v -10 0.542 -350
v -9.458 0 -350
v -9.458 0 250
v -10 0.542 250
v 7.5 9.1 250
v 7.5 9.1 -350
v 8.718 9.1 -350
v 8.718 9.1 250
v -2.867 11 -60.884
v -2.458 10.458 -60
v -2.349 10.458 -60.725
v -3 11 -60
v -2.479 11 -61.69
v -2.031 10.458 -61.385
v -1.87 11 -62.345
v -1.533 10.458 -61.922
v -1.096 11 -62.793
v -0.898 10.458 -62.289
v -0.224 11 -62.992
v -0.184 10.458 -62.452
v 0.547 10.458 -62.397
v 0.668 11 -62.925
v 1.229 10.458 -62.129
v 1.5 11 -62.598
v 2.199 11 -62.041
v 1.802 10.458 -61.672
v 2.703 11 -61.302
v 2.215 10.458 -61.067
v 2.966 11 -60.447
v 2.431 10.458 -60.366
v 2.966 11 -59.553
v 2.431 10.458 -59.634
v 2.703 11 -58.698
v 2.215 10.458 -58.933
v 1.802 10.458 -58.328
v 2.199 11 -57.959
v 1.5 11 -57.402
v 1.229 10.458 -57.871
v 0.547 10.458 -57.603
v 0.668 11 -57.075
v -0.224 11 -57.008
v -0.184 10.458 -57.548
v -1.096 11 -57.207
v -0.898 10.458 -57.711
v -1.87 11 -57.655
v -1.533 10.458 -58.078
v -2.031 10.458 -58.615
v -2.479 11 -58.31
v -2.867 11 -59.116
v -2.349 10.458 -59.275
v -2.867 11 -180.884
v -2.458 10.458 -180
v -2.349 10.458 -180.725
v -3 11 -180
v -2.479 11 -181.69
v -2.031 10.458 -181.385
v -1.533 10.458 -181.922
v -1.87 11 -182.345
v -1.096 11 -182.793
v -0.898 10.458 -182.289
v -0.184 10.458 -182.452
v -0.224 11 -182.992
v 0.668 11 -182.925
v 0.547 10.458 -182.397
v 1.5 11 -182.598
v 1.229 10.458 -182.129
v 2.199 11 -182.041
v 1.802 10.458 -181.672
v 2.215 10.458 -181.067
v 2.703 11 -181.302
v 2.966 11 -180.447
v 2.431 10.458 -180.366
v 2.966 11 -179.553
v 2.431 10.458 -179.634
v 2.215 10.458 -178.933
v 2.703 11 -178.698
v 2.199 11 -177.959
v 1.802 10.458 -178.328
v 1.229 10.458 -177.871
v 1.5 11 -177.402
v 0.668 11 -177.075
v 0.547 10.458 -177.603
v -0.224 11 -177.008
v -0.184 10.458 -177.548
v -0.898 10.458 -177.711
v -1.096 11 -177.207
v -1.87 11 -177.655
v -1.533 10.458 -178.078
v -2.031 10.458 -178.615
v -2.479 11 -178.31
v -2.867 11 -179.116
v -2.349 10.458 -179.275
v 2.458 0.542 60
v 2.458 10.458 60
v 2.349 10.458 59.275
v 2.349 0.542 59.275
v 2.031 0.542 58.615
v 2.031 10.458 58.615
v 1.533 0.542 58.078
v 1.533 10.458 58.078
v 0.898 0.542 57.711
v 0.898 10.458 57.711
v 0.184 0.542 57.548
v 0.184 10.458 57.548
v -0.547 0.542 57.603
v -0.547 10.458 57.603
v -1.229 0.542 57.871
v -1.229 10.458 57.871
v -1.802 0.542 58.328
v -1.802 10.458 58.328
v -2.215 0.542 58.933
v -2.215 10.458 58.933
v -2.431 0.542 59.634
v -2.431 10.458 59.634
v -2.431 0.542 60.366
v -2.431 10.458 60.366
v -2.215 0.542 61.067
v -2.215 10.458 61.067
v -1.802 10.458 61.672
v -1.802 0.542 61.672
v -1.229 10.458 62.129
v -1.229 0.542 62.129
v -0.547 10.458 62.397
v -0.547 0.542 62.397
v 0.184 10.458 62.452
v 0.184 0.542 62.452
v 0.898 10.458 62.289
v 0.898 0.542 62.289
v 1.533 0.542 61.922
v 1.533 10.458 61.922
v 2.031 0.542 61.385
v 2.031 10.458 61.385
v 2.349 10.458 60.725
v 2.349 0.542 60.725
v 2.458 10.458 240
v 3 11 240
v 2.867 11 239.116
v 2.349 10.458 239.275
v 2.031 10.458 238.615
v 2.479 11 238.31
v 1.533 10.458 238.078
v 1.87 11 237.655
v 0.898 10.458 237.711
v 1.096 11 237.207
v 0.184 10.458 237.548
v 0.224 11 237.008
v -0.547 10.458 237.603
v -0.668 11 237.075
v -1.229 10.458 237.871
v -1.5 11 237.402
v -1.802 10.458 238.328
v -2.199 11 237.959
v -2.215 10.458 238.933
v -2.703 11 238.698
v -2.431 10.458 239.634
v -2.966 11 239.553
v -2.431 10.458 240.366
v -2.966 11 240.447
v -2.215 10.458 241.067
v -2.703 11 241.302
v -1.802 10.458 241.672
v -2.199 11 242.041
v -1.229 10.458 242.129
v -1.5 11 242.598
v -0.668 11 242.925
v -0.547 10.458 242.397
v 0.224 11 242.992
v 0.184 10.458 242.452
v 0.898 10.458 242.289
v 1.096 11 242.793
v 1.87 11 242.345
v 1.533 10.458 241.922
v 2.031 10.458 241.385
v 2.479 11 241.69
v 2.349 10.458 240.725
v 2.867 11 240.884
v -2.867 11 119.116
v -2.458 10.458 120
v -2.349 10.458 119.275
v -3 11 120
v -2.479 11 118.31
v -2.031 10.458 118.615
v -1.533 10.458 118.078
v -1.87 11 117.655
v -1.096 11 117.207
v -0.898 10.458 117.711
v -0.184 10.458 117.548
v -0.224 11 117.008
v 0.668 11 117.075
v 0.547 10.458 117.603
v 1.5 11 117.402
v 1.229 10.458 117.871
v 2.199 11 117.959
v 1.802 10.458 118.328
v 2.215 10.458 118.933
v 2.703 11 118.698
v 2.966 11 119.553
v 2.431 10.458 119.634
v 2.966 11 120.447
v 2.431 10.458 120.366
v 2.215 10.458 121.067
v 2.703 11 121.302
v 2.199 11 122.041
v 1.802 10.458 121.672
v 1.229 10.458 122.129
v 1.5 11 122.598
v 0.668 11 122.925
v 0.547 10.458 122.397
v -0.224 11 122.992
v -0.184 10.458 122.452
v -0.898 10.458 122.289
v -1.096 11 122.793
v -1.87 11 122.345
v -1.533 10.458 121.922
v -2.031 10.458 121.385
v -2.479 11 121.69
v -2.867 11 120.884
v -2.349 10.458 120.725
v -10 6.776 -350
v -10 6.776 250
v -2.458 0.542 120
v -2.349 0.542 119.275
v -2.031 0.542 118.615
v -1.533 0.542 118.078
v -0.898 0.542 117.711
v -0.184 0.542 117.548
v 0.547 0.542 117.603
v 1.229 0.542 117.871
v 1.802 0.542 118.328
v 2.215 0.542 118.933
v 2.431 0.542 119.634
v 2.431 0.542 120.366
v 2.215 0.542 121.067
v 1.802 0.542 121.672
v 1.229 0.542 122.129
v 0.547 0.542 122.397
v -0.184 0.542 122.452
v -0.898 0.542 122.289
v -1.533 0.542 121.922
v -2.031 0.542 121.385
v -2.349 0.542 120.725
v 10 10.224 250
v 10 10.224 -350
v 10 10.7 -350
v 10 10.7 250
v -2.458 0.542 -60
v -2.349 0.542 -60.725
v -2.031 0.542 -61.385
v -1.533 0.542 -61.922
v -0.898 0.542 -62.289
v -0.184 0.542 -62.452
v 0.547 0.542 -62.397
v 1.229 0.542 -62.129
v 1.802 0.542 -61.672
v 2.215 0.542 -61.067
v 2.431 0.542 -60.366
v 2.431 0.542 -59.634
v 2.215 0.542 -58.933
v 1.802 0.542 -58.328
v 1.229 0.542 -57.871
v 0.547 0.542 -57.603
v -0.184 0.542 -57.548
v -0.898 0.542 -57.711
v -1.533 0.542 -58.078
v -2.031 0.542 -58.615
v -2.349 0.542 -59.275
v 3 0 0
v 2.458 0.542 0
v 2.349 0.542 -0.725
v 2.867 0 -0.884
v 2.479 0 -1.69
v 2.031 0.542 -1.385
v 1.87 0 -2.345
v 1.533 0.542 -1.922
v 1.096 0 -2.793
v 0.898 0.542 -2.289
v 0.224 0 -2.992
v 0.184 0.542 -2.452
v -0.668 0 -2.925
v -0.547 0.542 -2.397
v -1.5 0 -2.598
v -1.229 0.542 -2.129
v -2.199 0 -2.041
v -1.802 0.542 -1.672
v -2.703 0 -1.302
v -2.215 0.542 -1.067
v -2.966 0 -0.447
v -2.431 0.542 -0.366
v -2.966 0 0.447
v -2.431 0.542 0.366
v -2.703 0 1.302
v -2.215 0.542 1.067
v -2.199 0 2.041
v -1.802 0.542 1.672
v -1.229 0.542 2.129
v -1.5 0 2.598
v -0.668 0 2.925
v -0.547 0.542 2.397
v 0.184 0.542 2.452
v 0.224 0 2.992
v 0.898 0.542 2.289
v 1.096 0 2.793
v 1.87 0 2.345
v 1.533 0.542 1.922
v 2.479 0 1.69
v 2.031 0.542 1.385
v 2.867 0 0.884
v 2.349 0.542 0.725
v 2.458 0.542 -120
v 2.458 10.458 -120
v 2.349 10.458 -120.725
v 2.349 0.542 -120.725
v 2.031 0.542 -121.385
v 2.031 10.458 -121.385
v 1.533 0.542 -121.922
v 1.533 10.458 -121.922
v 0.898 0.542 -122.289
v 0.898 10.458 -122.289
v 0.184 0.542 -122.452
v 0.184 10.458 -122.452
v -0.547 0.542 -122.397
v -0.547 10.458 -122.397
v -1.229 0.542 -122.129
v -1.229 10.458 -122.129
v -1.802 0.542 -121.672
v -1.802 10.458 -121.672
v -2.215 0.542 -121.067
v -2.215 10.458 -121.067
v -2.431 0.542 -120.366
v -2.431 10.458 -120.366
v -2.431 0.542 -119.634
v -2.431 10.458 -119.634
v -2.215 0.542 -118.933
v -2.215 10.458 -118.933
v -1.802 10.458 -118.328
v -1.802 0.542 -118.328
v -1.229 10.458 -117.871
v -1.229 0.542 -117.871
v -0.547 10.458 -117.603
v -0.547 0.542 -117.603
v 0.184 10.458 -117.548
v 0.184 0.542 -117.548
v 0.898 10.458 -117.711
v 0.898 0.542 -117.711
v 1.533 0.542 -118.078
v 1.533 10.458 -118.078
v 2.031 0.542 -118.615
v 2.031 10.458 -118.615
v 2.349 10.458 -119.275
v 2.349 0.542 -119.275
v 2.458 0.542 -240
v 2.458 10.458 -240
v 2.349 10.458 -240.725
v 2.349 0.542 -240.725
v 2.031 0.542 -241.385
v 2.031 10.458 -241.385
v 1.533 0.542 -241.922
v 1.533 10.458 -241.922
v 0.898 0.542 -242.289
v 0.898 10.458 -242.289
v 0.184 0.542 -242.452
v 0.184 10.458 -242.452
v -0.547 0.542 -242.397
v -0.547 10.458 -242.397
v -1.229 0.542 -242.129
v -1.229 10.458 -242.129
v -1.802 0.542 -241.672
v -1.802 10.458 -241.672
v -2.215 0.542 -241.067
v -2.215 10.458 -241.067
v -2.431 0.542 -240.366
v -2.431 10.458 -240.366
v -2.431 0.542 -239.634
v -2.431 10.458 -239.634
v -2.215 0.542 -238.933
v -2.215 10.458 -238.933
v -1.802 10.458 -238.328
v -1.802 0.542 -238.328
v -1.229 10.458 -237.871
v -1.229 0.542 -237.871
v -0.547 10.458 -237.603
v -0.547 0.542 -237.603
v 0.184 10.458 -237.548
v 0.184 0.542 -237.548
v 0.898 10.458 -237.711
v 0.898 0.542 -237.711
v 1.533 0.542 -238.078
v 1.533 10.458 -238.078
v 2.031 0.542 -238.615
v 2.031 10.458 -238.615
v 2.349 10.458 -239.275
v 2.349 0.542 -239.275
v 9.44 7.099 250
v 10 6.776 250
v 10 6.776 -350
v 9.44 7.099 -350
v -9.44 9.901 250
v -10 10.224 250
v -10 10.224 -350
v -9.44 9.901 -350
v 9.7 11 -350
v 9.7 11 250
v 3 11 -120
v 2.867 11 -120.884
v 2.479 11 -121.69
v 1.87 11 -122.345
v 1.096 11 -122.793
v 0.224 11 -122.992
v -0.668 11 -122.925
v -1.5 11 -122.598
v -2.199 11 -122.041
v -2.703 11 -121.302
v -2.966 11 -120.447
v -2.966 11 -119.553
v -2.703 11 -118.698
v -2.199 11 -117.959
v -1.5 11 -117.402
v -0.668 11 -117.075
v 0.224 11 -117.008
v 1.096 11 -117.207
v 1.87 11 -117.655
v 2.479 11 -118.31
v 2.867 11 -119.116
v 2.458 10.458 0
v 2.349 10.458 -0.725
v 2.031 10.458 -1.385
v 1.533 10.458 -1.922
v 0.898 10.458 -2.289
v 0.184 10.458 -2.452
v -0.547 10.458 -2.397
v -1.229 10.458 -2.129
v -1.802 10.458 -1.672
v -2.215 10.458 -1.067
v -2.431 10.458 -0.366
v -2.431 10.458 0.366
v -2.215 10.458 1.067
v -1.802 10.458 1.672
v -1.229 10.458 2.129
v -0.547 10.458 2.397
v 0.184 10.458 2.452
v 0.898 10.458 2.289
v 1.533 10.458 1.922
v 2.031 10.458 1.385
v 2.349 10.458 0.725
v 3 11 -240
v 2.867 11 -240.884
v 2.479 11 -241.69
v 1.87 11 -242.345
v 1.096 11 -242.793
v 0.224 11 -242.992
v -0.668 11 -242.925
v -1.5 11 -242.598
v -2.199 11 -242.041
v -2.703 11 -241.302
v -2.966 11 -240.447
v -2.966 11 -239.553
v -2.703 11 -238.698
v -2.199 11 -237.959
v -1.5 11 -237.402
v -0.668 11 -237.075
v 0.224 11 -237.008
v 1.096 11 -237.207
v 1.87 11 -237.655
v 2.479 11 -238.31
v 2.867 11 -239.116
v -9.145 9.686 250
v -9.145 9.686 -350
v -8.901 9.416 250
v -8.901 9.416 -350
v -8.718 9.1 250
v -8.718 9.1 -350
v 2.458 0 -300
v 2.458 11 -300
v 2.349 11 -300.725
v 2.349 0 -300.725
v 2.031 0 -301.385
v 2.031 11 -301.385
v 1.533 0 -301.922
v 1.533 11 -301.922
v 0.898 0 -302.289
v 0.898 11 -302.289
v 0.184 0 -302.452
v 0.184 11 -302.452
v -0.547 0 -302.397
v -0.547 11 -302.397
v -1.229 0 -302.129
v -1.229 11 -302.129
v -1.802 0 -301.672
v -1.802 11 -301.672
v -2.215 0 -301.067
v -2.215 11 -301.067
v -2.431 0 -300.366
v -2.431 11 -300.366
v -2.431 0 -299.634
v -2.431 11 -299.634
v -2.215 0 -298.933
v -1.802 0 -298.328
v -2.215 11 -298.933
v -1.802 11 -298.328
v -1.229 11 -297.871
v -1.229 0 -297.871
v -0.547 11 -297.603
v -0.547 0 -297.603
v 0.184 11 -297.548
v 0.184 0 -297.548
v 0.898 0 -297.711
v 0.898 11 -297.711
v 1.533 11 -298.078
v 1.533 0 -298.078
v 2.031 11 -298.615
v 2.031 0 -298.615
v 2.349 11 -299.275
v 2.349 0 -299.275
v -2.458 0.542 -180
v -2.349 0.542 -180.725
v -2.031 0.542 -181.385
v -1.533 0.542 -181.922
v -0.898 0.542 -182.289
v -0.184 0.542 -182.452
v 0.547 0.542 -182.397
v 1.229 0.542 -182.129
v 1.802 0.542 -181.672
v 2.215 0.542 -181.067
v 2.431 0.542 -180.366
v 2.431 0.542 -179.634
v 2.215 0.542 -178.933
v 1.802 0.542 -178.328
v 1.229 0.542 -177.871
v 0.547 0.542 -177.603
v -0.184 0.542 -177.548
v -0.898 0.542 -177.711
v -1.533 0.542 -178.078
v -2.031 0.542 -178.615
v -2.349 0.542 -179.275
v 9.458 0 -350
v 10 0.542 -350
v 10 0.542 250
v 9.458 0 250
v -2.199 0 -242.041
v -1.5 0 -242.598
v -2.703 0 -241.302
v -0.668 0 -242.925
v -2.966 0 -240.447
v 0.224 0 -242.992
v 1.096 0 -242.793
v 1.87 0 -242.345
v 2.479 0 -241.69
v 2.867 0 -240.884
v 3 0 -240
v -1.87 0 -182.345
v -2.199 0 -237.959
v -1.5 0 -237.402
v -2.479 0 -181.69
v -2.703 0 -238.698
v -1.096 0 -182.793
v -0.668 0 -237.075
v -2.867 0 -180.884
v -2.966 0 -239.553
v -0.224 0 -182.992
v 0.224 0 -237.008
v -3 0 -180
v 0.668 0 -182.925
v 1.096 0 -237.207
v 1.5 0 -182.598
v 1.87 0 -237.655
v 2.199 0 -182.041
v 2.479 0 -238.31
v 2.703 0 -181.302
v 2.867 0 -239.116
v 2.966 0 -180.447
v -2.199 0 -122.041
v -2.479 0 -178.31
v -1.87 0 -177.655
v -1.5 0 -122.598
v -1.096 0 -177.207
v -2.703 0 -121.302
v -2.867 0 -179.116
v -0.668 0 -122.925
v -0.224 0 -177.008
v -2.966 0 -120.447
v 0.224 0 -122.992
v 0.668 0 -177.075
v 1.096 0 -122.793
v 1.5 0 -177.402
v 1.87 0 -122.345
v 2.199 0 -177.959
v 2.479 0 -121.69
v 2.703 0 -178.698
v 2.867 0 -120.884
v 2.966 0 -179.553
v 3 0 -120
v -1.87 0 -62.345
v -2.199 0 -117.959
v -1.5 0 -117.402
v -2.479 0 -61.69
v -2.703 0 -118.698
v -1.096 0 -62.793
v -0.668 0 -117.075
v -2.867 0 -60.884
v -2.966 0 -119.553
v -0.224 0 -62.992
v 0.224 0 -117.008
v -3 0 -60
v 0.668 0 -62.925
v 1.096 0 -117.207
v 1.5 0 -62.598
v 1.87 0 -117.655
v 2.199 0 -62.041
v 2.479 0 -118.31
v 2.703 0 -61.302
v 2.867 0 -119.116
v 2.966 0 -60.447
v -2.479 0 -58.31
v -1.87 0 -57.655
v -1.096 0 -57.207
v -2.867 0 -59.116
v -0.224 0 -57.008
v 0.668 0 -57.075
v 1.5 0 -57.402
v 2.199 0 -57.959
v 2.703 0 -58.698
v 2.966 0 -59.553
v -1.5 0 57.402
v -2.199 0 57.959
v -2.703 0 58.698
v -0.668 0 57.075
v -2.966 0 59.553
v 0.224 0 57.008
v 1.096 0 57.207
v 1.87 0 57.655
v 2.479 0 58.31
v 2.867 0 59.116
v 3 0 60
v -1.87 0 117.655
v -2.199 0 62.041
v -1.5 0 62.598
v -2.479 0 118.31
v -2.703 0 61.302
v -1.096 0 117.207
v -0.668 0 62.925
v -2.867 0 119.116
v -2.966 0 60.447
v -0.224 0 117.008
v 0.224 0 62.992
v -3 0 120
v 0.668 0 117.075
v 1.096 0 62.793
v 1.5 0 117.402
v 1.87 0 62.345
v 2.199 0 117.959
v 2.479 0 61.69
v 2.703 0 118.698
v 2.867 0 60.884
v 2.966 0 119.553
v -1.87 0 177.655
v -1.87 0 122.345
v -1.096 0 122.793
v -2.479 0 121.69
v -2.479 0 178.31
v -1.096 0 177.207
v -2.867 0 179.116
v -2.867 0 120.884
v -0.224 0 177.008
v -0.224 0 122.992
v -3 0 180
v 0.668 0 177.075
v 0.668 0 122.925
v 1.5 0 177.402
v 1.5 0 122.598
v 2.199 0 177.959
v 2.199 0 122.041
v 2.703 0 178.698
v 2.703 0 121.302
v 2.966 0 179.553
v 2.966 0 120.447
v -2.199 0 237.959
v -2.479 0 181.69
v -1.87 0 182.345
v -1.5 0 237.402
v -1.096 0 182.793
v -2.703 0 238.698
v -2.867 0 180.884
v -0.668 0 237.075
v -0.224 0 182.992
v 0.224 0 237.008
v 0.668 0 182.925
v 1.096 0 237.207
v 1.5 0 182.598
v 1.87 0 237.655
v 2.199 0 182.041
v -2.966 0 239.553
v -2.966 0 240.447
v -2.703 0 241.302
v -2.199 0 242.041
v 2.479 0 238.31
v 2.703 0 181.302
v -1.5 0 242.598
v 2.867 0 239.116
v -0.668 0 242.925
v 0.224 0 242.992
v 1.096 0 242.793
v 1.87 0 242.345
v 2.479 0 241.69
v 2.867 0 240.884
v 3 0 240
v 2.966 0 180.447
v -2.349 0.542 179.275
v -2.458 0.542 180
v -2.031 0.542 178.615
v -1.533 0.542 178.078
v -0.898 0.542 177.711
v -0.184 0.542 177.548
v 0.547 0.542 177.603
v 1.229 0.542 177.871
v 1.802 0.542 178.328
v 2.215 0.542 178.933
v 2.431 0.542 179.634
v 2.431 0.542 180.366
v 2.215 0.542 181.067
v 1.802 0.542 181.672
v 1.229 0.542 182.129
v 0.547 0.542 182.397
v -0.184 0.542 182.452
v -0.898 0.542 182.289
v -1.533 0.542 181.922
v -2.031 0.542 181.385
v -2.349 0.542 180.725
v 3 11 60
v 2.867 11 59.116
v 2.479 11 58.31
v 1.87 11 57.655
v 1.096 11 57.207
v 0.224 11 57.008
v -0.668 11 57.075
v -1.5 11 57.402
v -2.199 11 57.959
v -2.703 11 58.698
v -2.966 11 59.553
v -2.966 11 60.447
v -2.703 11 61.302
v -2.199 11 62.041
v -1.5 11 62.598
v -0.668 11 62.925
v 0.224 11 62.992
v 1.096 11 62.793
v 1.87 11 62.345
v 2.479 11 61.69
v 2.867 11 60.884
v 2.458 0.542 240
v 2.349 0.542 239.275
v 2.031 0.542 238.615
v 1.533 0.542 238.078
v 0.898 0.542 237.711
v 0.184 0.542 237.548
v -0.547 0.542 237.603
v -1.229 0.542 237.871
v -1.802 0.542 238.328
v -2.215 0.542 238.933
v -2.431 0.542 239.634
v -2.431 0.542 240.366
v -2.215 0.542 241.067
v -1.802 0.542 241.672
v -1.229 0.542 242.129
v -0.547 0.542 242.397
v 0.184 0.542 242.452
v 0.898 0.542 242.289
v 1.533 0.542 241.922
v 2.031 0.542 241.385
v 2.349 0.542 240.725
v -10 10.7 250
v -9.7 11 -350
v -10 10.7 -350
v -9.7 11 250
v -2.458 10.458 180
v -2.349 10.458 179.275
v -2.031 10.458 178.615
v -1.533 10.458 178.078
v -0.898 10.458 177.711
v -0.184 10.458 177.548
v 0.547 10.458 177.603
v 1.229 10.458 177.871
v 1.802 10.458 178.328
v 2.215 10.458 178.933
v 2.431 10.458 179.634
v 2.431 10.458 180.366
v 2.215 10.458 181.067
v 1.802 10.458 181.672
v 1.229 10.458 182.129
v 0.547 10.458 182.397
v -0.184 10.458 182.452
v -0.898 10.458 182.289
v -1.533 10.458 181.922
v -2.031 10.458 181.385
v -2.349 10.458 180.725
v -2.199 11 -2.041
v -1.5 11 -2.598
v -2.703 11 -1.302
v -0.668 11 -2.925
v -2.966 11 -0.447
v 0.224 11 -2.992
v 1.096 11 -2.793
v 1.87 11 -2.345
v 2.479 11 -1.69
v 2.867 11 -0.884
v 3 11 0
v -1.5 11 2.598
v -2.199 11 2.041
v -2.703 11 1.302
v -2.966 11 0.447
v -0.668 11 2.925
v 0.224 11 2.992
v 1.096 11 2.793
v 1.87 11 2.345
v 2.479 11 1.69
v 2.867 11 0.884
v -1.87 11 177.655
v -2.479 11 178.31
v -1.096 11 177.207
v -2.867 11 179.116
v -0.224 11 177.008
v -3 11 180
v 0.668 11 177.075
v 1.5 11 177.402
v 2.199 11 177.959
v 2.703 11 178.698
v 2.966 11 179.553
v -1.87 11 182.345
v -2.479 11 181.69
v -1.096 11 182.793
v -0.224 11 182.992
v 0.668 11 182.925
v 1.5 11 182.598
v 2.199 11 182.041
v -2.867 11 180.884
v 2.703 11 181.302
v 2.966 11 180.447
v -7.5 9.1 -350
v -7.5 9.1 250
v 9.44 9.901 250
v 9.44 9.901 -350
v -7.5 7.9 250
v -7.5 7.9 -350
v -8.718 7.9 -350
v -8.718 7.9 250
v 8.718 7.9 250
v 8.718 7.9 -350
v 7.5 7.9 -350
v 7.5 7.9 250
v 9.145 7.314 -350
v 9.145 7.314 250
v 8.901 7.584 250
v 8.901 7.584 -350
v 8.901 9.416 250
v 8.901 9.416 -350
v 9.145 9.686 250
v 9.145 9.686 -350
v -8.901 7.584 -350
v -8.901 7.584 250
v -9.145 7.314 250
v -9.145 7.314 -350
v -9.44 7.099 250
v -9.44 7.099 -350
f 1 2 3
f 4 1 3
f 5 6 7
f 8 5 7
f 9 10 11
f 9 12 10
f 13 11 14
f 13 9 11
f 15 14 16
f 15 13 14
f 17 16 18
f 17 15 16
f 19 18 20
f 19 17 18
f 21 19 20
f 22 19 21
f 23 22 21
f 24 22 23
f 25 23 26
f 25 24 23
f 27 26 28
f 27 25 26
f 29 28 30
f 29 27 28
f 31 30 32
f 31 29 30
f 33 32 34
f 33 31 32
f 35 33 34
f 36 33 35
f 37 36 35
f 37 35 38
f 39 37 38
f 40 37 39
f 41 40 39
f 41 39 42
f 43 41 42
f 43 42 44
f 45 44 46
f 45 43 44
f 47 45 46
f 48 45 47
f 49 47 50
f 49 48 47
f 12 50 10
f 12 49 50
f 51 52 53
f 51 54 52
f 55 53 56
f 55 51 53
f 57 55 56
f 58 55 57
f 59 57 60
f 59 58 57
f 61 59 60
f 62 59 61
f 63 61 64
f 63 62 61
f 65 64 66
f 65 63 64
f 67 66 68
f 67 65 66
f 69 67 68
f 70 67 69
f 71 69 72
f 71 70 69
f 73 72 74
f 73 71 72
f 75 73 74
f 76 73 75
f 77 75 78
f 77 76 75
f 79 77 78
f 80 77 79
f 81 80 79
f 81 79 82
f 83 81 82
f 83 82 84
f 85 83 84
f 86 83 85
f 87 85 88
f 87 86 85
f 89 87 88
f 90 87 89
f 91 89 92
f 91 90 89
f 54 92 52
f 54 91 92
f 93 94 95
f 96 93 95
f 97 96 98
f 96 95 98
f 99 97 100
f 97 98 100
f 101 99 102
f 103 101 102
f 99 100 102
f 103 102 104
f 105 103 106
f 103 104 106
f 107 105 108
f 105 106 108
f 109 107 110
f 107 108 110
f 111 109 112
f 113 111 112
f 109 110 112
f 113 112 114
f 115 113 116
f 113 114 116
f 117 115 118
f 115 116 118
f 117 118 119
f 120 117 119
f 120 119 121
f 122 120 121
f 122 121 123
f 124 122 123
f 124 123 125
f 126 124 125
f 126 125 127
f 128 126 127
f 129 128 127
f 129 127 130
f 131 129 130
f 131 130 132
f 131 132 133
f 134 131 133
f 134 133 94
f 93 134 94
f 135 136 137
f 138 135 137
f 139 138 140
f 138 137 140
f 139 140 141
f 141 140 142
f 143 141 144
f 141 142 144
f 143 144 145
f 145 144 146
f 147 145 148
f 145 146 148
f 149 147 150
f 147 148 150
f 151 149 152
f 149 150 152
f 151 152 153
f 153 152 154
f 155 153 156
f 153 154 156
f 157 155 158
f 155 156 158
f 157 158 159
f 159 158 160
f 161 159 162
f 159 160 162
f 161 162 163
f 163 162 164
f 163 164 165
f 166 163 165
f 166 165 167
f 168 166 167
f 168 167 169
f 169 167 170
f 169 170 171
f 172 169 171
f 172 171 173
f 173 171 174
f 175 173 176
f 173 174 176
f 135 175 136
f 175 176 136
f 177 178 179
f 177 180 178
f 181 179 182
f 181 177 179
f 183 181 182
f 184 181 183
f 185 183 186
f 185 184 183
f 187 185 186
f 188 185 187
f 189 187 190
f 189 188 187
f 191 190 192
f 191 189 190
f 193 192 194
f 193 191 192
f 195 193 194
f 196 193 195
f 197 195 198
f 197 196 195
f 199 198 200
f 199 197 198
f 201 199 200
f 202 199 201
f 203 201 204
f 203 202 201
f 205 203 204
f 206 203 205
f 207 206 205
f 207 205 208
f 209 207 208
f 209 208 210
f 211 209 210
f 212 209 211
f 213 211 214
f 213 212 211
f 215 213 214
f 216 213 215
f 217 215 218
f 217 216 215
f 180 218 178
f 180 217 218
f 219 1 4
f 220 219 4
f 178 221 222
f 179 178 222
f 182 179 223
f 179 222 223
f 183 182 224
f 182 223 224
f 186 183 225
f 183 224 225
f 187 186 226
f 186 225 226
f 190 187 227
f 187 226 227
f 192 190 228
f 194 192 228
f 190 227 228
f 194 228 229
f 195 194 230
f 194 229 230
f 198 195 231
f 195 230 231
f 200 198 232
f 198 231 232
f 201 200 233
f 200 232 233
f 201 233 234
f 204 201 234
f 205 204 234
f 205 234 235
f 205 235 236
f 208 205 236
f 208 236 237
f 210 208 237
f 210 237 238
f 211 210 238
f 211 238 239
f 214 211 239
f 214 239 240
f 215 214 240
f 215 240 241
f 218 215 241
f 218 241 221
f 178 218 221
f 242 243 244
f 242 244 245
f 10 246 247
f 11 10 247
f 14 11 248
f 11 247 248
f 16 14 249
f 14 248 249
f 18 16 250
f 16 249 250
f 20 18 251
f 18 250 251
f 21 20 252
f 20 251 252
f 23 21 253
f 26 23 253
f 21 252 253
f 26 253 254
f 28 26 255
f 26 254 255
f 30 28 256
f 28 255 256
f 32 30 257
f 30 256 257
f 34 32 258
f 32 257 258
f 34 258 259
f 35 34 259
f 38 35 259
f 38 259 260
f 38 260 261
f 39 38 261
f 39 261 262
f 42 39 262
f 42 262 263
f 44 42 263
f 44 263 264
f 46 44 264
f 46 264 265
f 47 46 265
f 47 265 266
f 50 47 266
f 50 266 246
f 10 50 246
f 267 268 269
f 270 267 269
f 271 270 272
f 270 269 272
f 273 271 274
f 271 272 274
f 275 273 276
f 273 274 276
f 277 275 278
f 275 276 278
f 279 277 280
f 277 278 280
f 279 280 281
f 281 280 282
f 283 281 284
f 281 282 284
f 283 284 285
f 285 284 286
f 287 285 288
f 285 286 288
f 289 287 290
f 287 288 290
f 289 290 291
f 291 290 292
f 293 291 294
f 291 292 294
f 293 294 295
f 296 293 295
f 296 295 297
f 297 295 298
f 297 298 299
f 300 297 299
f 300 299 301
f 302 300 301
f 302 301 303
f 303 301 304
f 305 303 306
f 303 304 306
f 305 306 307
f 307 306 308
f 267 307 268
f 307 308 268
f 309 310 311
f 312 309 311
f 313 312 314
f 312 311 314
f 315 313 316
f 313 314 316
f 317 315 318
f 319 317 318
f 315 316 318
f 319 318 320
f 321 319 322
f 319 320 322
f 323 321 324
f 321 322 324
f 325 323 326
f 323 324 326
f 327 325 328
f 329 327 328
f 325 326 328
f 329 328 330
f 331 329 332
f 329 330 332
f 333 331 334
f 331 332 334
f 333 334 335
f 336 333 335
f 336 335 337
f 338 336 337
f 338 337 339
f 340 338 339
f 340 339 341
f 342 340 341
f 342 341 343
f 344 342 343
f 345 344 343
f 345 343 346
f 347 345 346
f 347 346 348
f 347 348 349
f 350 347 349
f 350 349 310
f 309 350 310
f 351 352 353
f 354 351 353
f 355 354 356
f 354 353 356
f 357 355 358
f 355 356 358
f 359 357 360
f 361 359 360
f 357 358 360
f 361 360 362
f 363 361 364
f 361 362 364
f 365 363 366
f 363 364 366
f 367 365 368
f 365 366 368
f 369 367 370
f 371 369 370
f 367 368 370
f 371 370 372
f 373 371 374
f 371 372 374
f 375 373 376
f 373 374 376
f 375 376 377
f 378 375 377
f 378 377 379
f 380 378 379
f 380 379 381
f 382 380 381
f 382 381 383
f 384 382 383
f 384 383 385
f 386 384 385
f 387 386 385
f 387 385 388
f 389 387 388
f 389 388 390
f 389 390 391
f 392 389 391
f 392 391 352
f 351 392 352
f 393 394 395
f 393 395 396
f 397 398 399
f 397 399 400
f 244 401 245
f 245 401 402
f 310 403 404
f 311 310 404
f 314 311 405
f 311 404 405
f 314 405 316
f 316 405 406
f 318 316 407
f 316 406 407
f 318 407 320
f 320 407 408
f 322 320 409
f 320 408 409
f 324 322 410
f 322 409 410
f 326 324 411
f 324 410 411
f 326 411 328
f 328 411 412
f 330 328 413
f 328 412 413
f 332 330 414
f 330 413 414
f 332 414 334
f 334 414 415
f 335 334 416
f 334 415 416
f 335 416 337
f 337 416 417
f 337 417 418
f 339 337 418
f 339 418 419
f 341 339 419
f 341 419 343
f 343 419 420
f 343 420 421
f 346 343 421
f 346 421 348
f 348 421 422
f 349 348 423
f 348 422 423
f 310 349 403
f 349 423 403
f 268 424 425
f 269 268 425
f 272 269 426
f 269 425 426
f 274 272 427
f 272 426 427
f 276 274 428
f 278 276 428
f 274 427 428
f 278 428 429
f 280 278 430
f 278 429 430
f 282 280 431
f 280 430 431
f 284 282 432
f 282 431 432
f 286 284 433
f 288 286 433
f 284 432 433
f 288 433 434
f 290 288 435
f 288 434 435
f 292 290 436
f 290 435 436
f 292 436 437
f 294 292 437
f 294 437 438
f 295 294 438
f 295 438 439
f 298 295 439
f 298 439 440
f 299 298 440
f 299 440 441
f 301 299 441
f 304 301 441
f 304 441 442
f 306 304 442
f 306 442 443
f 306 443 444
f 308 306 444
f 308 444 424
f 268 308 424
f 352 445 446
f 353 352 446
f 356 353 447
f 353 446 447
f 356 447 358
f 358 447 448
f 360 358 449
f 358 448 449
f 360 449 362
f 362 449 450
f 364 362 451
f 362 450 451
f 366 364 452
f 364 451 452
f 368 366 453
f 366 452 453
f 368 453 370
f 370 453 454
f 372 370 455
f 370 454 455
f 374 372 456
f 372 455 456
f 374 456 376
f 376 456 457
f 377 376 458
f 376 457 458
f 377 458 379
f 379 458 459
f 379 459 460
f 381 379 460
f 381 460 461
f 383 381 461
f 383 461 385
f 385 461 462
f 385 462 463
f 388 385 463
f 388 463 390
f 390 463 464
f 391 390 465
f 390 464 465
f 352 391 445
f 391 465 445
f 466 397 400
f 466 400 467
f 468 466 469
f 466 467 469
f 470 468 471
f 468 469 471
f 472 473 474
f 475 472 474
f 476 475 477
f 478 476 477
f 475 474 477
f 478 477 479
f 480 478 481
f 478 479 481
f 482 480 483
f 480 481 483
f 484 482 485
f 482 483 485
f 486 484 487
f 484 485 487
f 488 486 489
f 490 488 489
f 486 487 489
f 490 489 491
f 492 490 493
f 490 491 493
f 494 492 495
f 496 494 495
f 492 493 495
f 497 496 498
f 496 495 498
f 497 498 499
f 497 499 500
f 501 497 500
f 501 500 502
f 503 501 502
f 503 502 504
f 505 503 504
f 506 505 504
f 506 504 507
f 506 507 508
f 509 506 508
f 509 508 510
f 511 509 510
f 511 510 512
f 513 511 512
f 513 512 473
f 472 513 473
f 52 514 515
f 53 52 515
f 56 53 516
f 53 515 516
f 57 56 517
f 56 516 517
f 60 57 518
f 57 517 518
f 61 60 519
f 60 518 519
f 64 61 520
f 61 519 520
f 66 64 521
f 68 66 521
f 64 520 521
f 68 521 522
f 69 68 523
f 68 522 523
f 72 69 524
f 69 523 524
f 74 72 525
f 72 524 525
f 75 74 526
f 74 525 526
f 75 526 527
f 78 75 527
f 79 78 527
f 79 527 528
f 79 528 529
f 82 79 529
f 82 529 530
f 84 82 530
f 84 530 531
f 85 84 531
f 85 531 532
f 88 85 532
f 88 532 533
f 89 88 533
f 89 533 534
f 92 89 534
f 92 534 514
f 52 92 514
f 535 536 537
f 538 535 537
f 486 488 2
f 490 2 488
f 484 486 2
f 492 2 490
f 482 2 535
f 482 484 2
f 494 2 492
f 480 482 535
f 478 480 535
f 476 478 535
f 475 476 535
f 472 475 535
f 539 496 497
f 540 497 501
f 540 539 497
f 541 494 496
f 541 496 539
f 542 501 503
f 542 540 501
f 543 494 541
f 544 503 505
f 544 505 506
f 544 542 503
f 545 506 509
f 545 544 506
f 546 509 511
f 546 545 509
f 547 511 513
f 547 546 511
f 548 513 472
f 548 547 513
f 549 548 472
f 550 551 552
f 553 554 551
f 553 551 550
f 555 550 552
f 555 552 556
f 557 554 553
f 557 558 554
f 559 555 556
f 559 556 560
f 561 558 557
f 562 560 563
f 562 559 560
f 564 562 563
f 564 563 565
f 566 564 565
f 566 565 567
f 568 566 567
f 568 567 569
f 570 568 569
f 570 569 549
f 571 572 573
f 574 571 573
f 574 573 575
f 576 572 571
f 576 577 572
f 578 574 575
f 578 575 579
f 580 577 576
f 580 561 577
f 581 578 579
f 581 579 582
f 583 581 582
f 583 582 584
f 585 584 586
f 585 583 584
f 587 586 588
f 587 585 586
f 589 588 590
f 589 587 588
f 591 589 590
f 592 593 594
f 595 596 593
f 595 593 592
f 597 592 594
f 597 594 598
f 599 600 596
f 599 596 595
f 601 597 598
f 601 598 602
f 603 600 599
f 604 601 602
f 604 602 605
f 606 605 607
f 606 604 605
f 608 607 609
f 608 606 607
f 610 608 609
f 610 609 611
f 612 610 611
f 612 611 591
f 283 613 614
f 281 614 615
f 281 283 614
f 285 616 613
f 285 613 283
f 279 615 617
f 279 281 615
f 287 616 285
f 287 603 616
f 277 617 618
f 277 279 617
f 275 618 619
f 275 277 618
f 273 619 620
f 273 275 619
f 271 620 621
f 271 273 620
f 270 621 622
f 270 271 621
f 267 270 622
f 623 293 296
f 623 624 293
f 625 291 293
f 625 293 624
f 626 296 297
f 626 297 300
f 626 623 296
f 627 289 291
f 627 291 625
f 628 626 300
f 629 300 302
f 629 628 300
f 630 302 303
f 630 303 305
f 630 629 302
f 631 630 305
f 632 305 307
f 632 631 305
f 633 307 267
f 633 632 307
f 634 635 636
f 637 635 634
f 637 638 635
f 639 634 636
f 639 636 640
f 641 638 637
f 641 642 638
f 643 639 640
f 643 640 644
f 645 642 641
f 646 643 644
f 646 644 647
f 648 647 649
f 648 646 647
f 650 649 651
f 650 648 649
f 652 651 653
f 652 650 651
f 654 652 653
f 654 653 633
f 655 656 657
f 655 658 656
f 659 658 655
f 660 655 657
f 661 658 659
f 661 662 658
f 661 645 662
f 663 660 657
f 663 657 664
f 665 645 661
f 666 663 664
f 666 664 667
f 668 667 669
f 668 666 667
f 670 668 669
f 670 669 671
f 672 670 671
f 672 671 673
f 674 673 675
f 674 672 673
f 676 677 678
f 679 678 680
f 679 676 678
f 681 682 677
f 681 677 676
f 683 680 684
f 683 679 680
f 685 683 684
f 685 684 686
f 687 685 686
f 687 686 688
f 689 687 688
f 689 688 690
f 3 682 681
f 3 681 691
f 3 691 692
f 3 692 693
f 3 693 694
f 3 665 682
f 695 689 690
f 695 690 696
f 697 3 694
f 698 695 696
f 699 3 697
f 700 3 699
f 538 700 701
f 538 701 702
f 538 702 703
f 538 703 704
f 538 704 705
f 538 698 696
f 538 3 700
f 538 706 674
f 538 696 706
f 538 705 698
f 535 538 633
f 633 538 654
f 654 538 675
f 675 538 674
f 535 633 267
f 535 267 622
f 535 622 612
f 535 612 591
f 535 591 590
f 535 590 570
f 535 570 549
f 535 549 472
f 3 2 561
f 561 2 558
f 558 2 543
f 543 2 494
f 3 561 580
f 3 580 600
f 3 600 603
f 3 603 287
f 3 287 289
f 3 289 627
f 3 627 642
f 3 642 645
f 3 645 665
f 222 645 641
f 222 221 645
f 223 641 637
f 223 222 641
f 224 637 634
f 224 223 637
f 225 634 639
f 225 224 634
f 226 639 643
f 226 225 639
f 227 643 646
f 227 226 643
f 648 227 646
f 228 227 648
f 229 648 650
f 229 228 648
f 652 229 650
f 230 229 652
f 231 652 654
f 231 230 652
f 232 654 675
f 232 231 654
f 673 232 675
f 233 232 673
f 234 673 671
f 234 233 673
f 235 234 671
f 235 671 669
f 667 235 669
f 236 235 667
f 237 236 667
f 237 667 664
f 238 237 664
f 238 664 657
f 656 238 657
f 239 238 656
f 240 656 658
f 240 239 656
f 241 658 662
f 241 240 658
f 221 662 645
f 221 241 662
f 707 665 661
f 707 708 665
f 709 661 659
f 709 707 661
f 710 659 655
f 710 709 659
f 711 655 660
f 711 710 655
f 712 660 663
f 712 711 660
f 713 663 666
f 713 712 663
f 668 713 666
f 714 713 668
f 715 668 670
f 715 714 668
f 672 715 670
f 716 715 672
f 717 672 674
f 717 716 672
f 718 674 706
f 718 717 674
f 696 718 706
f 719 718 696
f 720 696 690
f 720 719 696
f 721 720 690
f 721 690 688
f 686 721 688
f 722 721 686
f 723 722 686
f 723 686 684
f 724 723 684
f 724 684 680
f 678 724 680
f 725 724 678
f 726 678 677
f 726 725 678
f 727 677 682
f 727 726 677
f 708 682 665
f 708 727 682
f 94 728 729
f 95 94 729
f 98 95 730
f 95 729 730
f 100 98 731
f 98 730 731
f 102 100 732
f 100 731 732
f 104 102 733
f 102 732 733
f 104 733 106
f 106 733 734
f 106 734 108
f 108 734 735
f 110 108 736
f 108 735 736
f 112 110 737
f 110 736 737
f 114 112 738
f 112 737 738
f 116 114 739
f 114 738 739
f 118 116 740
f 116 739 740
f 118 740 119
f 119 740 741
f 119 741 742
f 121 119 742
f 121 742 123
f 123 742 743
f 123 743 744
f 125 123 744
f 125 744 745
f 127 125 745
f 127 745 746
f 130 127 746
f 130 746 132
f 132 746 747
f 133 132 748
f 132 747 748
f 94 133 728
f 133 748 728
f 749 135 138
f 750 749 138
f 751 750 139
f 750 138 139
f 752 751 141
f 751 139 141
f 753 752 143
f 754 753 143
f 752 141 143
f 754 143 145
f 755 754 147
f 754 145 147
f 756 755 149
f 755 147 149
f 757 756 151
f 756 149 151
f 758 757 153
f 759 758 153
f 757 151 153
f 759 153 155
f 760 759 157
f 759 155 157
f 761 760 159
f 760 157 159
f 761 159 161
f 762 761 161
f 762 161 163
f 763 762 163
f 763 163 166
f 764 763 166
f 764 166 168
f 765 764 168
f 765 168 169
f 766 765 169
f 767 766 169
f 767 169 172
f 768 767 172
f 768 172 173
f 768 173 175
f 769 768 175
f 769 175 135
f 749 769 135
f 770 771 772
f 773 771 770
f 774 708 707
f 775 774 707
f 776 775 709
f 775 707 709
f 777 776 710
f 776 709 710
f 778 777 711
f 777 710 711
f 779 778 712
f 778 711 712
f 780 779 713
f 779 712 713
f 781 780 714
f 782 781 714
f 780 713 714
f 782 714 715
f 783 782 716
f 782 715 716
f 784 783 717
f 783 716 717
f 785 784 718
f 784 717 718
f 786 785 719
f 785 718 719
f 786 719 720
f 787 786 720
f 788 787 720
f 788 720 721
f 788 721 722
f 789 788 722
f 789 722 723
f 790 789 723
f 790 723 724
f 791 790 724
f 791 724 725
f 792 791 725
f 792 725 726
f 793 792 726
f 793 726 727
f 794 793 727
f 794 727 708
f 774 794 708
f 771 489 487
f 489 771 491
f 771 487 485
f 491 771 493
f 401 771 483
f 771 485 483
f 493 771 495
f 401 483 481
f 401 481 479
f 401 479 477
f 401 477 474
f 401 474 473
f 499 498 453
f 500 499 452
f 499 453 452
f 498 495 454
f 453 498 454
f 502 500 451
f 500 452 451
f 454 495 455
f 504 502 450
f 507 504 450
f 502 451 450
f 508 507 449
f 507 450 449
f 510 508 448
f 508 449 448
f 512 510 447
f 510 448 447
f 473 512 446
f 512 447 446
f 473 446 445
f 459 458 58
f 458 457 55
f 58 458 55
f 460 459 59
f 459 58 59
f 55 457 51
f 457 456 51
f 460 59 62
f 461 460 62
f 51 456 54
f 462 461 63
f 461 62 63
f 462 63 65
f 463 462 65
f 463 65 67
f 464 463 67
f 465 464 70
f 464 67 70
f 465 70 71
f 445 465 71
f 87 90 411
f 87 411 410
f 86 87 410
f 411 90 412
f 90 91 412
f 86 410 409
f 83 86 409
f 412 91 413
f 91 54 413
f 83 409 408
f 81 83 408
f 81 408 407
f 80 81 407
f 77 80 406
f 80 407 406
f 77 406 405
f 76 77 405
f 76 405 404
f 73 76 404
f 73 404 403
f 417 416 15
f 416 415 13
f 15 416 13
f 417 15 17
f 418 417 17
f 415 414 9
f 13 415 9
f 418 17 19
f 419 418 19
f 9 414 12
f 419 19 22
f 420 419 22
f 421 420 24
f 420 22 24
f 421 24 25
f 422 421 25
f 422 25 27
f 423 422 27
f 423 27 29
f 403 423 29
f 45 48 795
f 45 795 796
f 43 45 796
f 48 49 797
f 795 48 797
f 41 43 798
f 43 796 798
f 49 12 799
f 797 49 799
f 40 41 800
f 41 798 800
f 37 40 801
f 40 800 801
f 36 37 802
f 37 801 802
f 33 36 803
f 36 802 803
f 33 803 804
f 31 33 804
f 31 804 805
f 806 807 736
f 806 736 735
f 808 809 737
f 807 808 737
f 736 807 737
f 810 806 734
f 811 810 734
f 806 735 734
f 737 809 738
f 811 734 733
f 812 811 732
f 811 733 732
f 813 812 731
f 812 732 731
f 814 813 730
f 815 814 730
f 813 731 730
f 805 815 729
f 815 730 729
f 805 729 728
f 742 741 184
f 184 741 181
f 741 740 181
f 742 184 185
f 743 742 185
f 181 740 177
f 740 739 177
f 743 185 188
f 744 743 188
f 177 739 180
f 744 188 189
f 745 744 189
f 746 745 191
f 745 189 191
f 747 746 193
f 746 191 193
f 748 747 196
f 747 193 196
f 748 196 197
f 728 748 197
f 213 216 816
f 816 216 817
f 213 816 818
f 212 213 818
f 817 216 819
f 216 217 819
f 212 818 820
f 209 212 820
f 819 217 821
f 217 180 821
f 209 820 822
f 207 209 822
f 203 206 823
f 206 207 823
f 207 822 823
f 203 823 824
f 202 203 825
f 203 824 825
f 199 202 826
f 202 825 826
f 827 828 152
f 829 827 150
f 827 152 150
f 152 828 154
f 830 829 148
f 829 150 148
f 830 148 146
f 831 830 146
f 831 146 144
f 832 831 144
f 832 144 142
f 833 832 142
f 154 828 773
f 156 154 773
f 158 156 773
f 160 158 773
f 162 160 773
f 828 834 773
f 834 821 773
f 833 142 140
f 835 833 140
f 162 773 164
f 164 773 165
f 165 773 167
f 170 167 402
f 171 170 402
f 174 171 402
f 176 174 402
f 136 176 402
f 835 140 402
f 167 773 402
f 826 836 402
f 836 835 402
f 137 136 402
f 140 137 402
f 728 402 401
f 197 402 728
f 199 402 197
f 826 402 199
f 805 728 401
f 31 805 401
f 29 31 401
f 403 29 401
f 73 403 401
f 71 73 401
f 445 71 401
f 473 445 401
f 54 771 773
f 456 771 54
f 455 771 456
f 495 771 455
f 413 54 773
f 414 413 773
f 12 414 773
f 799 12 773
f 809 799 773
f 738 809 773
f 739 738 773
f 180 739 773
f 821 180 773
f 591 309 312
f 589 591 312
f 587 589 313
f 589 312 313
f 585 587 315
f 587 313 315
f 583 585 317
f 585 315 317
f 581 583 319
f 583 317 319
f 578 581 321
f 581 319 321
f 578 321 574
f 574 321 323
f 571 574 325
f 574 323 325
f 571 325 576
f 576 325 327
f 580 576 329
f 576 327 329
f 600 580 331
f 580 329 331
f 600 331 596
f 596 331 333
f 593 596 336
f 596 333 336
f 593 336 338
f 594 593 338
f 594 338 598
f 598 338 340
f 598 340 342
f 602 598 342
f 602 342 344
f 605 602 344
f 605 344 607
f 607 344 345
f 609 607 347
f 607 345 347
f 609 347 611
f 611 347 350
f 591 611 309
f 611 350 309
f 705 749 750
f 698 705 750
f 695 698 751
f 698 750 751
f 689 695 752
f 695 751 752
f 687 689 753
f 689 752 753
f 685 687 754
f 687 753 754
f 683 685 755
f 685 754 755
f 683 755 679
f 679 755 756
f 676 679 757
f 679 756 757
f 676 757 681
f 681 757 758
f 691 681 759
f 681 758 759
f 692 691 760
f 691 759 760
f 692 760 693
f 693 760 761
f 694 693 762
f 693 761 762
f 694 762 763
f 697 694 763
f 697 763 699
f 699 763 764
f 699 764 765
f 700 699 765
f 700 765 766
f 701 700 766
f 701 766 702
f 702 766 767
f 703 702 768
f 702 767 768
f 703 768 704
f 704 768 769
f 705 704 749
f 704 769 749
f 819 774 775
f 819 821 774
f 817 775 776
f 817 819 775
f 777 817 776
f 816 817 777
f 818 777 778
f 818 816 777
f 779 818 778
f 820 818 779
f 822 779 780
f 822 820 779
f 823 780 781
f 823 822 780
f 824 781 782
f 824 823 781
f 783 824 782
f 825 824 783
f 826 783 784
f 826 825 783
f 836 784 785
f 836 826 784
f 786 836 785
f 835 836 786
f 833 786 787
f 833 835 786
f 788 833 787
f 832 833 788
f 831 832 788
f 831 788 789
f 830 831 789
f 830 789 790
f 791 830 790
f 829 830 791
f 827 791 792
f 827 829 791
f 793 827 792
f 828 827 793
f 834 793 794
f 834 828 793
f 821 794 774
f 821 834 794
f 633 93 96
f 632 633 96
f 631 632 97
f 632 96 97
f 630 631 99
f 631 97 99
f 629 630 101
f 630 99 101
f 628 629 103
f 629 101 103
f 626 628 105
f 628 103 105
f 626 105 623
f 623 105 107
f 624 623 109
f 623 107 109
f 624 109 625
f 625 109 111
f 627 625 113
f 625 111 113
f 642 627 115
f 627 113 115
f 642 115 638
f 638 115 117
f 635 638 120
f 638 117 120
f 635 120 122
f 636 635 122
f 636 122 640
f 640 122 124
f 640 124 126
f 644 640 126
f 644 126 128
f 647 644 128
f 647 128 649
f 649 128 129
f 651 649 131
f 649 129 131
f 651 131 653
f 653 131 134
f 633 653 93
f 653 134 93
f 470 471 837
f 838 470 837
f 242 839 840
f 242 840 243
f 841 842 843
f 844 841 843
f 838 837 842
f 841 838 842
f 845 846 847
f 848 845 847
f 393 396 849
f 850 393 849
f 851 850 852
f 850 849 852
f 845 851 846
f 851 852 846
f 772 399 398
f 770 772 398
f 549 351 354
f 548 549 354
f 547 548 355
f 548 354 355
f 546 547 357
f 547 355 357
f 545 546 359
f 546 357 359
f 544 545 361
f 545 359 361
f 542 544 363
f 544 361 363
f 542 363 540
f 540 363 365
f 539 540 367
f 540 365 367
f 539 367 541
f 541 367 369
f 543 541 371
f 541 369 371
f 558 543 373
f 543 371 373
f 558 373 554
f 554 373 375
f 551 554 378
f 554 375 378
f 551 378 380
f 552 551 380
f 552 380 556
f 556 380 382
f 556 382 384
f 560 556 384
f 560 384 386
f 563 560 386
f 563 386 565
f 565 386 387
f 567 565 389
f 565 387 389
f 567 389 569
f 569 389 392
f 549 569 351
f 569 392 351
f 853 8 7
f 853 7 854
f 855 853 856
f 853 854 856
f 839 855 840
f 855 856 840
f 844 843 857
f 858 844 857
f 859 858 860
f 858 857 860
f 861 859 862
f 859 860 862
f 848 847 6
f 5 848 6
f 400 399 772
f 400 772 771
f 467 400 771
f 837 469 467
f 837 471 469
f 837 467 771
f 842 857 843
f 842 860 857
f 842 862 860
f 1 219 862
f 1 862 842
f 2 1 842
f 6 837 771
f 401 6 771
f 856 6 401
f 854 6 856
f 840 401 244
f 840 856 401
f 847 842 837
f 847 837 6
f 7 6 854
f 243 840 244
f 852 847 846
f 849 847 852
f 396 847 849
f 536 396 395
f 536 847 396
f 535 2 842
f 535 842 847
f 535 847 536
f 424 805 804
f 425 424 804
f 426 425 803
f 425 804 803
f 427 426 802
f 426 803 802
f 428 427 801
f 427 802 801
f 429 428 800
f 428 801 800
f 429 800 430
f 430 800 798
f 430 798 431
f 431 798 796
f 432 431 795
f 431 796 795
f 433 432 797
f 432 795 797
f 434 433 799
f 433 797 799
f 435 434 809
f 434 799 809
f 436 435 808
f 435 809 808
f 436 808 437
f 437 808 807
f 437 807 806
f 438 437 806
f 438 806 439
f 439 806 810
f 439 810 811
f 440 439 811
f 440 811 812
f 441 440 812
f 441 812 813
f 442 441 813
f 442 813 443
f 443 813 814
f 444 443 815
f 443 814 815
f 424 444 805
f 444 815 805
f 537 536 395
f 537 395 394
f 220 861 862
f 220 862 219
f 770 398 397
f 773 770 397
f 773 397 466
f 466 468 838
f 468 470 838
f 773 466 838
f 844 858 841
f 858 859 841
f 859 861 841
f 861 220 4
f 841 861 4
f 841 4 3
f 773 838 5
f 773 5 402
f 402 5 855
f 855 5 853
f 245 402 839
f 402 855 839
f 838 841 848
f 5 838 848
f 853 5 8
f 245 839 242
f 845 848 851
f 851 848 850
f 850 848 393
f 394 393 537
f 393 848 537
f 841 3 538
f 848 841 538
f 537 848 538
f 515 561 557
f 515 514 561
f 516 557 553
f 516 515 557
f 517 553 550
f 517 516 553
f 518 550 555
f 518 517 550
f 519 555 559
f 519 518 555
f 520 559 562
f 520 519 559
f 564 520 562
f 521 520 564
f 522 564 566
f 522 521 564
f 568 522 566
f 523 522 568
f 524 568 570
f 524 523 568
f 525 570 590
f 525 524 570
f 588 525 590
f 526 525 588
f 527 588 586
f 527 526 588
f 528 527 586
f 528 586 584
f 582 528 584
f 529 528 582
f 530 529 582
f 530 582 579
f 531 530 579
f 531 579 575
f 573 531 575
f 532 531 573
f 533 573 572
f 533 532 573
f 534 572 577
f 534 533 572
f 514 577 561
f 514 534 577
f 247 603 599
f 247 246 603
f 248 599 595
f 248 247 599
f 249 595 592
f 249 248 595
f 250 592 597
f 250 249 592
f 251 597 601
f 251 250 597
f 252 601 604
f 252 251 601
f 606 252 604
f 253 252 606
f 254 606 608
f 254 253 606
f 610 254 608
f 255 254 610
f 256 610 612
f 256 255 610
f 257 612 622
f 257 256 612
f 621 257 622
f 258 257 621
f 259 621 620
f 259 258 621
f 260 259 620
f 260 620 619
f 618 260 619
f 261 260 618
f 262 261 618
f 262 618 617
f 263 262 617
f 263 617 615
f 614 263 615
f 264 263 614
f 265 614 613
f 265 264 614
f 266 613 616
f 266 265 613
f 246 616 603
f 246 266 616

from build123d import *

# Parameters (mm, degrees)
ESQUISSE1_W                = 20
ESQUISSE1_H                = 600
BOSS_EXTRU_1_DEPTH         = 11
ENL_V_MAT_EXTRU_1_DEPTH    = 601.184138411
ENL_V_MAT_EXTRU_2_DEPTH    = 601.184138411
ENL_V_MAT_EXTRU_3_DEPTH    = 601.184138411
ENL_V_MAT_EXTRU_4_DEPTH    = 601.184138411
PER_AGE1_D                 = 4.917
PER_AGE2_D                 = 4.917
CHANFREIN1_SIZE            = 0.5415
CHANFREIN2_SIZE            = 0.3
R_P_TITION_LIN_AIRE1_COUNT = 9
R_P_TITION_LIN_AIRE1_PITCH = 60


with BuildPart() as part:
    # Esquisse1 → Boss.-Extru.1 (new body)
    with BuildSketch(Plane.XZ):
        with Locations((0, -50)):
            Rectangle(ESQUISSE1_W, ESQUISSE1_H)
    extrude(amount=-BOSS_EXTRU_1_DEPTH)

    # Esquisse2 → Enlèv. mat.-Extru.1 (cut, through all)
    with BuildSketch(Plane(origin=(0, 0, -350), x_dir=(-1, 0, 0), z_dir=(0, 0, -1))):
        with BuildLine():
            Line((10, 7.9), (10, 10.22385))
            Line((10, 10.22385), (9.440021531, 9.900556887))
            ThreePointArc((9.440021531, 9.900556887), (9.015681976, 9.557293765), (8.71772889, 9.1))
            Line((8.71772889, 9.1), (7.5, 9.1))
            Line((7.5, 9.1), (7.5, 7.9))
            Line((7.5, 7.9), (10, 7.9))
        make_face()
    extrude(amount=-ENL_V_MAT_EXTRU_1_DEPTH, mode=Mode.SUBTRACT)

    # Esquisse3 → Enlèv. mat.-Extru.2 (cut, through all)
    with BuildSketch(Plane(origin=(0, 0, -350), x_dir=(-1, 0, 0), z_dir=(0, 0, -1))):
        with BuildLine():
            Line((9.440021531, 7.099443113), (10, 6.77615))
            Line((10, 6.77615), (10, 7.9))
            Line((10, 7.9), (8.71772889, 7.9))
            ThreePointArc((8.71772889, 7.9), (9.015681976, 7.442706235), (9.440021531, 7.099443113))
        make_face()
    extrude(amount=-ENL_V_MAT_EXTRU_2_DEPTH, mode=Mode.SUBTRACT)

    # Esquisse4 → Enlèv. mat.-Extru.3 (cut, through all)
    with BuildSketch(Plane(origin=(0, 0, -350), x_dir=(-1, 0, 0), z_dir=(0, 0, -1))):
        with BuildLine():
            Line((-10, 9.1), (-10, 6.77615))
            Line((-10, 6.77615), (-9.440021531, 7.099443113))
            ThreePointArc((-9.440021531, 7.099443113), (-9.015681976, 7.442706235), (-8.71772889, 7.9))
            Line((-8.71772889, 7.9), (-7.5, 7.9))
            Line((-7.5, 7.9), (-7.5, 9.1))
            Line((-7.5, 9.1), (-10, 9.1))
        make_face()
    extrude(amount=-ENL_V_MAT_EXTRU_3_DEPTH, mode=Mode.SUBTRACT)

    # Esquisse5 → Enlèv. mat.-Extru.4 (cut, through all)
    with BuildSketch(Plane(origin=(0, 0, -350), x_dir=(-1, 0, 0), z_dir=(0, 0, -1))):
        with BuildLine():
            Line((-9.440021531, 9.900556887), (-10, 10.22385))
            Line((-10, 10.22385), (-10, 9.1))
            Line((-10, 9.1), (-8.71772889, 9.1))
            ThreePointArc((-8.71772889, 9.1), (-9.015681976, 9.557293765), (-9.440021531, 9.900556887))
        make_face()
    extrude(amount=-ENL_V_MAT_EXTRU_4_DEPTH, mode=Mode.SUBTRACT)

    # Perçage1 (through all)
    with Locations(Plane(origin=(0, 11, 0), x_dir=(1, 0, 0), z_dir=(0, 1, 0))):
        with Locations((0, -180), (0, -120), (0, 60), (0, 180)):
            Hole(PER_AGE1_D / 2)

    # Perçage2 (through all)
    with Locations(Plane(origin=(0, 0, 0), x_dir=(-1, 0, 0), z_dir=(0, -1, 0))):
        with Locations((0, -240), (0, -60), (0, 0), (0, 120), (0, 240)):
            per_age2 = Hole(PER_AGE2_D / 2)

    # Chanfrein1
    chanfrein1_edges = [part.edges().sort_by_distance(p)[0] for p in [
        (2.4585, 11, 180),
        (2.4585, 0, 180),
        (-2.4585, 0, -240),
        (-2.4585, 11, -240),
        (-2.4585, 0, -120),
        (-2.4585, 11, -120),
        (-2.4585, 0, 0),
        (-2.4585, 11, 0),
        (-2.4585, 0, 60),
        (-2.4585, 11, 60),
        (-2.4585, 0, 240),
        (-2.4585, 11, 240),
        (10, 0, -50),
        (-10, 0, -50),
        (2.4585, 11, -180),
        (2.4585, 0, -180),
        (2.4585, 11, -60),
        (2.4585, 0, -60),
        (2.4585, 11, 120),
        (2.4585, 0, 120),
    ]]
    chamfer(chanfrein1_edges, length=CHANFREIN1_SIZE)

    # Chanfrein2
    chanfrein2_edges = [part.edges().sort_by_distance(p)[0] for p in [
        (10, 11, -50),
        (-10, 11, -50),
    ]]
    chamfer(chanfrein2_edges, length=CHANFREIN2_SIZE)

    # Répétition linéaire1: Perçage2 ×9
    with Locations(*[(0, 0, -i * R_P_TITION_LIN_AIRE1_PITCH) for i in range(1, R_P_TITION_LIN_AIRE1_COUNT)]):
        add(per_age2, mode=Mode.SUBTRACT)


solid = part.part
